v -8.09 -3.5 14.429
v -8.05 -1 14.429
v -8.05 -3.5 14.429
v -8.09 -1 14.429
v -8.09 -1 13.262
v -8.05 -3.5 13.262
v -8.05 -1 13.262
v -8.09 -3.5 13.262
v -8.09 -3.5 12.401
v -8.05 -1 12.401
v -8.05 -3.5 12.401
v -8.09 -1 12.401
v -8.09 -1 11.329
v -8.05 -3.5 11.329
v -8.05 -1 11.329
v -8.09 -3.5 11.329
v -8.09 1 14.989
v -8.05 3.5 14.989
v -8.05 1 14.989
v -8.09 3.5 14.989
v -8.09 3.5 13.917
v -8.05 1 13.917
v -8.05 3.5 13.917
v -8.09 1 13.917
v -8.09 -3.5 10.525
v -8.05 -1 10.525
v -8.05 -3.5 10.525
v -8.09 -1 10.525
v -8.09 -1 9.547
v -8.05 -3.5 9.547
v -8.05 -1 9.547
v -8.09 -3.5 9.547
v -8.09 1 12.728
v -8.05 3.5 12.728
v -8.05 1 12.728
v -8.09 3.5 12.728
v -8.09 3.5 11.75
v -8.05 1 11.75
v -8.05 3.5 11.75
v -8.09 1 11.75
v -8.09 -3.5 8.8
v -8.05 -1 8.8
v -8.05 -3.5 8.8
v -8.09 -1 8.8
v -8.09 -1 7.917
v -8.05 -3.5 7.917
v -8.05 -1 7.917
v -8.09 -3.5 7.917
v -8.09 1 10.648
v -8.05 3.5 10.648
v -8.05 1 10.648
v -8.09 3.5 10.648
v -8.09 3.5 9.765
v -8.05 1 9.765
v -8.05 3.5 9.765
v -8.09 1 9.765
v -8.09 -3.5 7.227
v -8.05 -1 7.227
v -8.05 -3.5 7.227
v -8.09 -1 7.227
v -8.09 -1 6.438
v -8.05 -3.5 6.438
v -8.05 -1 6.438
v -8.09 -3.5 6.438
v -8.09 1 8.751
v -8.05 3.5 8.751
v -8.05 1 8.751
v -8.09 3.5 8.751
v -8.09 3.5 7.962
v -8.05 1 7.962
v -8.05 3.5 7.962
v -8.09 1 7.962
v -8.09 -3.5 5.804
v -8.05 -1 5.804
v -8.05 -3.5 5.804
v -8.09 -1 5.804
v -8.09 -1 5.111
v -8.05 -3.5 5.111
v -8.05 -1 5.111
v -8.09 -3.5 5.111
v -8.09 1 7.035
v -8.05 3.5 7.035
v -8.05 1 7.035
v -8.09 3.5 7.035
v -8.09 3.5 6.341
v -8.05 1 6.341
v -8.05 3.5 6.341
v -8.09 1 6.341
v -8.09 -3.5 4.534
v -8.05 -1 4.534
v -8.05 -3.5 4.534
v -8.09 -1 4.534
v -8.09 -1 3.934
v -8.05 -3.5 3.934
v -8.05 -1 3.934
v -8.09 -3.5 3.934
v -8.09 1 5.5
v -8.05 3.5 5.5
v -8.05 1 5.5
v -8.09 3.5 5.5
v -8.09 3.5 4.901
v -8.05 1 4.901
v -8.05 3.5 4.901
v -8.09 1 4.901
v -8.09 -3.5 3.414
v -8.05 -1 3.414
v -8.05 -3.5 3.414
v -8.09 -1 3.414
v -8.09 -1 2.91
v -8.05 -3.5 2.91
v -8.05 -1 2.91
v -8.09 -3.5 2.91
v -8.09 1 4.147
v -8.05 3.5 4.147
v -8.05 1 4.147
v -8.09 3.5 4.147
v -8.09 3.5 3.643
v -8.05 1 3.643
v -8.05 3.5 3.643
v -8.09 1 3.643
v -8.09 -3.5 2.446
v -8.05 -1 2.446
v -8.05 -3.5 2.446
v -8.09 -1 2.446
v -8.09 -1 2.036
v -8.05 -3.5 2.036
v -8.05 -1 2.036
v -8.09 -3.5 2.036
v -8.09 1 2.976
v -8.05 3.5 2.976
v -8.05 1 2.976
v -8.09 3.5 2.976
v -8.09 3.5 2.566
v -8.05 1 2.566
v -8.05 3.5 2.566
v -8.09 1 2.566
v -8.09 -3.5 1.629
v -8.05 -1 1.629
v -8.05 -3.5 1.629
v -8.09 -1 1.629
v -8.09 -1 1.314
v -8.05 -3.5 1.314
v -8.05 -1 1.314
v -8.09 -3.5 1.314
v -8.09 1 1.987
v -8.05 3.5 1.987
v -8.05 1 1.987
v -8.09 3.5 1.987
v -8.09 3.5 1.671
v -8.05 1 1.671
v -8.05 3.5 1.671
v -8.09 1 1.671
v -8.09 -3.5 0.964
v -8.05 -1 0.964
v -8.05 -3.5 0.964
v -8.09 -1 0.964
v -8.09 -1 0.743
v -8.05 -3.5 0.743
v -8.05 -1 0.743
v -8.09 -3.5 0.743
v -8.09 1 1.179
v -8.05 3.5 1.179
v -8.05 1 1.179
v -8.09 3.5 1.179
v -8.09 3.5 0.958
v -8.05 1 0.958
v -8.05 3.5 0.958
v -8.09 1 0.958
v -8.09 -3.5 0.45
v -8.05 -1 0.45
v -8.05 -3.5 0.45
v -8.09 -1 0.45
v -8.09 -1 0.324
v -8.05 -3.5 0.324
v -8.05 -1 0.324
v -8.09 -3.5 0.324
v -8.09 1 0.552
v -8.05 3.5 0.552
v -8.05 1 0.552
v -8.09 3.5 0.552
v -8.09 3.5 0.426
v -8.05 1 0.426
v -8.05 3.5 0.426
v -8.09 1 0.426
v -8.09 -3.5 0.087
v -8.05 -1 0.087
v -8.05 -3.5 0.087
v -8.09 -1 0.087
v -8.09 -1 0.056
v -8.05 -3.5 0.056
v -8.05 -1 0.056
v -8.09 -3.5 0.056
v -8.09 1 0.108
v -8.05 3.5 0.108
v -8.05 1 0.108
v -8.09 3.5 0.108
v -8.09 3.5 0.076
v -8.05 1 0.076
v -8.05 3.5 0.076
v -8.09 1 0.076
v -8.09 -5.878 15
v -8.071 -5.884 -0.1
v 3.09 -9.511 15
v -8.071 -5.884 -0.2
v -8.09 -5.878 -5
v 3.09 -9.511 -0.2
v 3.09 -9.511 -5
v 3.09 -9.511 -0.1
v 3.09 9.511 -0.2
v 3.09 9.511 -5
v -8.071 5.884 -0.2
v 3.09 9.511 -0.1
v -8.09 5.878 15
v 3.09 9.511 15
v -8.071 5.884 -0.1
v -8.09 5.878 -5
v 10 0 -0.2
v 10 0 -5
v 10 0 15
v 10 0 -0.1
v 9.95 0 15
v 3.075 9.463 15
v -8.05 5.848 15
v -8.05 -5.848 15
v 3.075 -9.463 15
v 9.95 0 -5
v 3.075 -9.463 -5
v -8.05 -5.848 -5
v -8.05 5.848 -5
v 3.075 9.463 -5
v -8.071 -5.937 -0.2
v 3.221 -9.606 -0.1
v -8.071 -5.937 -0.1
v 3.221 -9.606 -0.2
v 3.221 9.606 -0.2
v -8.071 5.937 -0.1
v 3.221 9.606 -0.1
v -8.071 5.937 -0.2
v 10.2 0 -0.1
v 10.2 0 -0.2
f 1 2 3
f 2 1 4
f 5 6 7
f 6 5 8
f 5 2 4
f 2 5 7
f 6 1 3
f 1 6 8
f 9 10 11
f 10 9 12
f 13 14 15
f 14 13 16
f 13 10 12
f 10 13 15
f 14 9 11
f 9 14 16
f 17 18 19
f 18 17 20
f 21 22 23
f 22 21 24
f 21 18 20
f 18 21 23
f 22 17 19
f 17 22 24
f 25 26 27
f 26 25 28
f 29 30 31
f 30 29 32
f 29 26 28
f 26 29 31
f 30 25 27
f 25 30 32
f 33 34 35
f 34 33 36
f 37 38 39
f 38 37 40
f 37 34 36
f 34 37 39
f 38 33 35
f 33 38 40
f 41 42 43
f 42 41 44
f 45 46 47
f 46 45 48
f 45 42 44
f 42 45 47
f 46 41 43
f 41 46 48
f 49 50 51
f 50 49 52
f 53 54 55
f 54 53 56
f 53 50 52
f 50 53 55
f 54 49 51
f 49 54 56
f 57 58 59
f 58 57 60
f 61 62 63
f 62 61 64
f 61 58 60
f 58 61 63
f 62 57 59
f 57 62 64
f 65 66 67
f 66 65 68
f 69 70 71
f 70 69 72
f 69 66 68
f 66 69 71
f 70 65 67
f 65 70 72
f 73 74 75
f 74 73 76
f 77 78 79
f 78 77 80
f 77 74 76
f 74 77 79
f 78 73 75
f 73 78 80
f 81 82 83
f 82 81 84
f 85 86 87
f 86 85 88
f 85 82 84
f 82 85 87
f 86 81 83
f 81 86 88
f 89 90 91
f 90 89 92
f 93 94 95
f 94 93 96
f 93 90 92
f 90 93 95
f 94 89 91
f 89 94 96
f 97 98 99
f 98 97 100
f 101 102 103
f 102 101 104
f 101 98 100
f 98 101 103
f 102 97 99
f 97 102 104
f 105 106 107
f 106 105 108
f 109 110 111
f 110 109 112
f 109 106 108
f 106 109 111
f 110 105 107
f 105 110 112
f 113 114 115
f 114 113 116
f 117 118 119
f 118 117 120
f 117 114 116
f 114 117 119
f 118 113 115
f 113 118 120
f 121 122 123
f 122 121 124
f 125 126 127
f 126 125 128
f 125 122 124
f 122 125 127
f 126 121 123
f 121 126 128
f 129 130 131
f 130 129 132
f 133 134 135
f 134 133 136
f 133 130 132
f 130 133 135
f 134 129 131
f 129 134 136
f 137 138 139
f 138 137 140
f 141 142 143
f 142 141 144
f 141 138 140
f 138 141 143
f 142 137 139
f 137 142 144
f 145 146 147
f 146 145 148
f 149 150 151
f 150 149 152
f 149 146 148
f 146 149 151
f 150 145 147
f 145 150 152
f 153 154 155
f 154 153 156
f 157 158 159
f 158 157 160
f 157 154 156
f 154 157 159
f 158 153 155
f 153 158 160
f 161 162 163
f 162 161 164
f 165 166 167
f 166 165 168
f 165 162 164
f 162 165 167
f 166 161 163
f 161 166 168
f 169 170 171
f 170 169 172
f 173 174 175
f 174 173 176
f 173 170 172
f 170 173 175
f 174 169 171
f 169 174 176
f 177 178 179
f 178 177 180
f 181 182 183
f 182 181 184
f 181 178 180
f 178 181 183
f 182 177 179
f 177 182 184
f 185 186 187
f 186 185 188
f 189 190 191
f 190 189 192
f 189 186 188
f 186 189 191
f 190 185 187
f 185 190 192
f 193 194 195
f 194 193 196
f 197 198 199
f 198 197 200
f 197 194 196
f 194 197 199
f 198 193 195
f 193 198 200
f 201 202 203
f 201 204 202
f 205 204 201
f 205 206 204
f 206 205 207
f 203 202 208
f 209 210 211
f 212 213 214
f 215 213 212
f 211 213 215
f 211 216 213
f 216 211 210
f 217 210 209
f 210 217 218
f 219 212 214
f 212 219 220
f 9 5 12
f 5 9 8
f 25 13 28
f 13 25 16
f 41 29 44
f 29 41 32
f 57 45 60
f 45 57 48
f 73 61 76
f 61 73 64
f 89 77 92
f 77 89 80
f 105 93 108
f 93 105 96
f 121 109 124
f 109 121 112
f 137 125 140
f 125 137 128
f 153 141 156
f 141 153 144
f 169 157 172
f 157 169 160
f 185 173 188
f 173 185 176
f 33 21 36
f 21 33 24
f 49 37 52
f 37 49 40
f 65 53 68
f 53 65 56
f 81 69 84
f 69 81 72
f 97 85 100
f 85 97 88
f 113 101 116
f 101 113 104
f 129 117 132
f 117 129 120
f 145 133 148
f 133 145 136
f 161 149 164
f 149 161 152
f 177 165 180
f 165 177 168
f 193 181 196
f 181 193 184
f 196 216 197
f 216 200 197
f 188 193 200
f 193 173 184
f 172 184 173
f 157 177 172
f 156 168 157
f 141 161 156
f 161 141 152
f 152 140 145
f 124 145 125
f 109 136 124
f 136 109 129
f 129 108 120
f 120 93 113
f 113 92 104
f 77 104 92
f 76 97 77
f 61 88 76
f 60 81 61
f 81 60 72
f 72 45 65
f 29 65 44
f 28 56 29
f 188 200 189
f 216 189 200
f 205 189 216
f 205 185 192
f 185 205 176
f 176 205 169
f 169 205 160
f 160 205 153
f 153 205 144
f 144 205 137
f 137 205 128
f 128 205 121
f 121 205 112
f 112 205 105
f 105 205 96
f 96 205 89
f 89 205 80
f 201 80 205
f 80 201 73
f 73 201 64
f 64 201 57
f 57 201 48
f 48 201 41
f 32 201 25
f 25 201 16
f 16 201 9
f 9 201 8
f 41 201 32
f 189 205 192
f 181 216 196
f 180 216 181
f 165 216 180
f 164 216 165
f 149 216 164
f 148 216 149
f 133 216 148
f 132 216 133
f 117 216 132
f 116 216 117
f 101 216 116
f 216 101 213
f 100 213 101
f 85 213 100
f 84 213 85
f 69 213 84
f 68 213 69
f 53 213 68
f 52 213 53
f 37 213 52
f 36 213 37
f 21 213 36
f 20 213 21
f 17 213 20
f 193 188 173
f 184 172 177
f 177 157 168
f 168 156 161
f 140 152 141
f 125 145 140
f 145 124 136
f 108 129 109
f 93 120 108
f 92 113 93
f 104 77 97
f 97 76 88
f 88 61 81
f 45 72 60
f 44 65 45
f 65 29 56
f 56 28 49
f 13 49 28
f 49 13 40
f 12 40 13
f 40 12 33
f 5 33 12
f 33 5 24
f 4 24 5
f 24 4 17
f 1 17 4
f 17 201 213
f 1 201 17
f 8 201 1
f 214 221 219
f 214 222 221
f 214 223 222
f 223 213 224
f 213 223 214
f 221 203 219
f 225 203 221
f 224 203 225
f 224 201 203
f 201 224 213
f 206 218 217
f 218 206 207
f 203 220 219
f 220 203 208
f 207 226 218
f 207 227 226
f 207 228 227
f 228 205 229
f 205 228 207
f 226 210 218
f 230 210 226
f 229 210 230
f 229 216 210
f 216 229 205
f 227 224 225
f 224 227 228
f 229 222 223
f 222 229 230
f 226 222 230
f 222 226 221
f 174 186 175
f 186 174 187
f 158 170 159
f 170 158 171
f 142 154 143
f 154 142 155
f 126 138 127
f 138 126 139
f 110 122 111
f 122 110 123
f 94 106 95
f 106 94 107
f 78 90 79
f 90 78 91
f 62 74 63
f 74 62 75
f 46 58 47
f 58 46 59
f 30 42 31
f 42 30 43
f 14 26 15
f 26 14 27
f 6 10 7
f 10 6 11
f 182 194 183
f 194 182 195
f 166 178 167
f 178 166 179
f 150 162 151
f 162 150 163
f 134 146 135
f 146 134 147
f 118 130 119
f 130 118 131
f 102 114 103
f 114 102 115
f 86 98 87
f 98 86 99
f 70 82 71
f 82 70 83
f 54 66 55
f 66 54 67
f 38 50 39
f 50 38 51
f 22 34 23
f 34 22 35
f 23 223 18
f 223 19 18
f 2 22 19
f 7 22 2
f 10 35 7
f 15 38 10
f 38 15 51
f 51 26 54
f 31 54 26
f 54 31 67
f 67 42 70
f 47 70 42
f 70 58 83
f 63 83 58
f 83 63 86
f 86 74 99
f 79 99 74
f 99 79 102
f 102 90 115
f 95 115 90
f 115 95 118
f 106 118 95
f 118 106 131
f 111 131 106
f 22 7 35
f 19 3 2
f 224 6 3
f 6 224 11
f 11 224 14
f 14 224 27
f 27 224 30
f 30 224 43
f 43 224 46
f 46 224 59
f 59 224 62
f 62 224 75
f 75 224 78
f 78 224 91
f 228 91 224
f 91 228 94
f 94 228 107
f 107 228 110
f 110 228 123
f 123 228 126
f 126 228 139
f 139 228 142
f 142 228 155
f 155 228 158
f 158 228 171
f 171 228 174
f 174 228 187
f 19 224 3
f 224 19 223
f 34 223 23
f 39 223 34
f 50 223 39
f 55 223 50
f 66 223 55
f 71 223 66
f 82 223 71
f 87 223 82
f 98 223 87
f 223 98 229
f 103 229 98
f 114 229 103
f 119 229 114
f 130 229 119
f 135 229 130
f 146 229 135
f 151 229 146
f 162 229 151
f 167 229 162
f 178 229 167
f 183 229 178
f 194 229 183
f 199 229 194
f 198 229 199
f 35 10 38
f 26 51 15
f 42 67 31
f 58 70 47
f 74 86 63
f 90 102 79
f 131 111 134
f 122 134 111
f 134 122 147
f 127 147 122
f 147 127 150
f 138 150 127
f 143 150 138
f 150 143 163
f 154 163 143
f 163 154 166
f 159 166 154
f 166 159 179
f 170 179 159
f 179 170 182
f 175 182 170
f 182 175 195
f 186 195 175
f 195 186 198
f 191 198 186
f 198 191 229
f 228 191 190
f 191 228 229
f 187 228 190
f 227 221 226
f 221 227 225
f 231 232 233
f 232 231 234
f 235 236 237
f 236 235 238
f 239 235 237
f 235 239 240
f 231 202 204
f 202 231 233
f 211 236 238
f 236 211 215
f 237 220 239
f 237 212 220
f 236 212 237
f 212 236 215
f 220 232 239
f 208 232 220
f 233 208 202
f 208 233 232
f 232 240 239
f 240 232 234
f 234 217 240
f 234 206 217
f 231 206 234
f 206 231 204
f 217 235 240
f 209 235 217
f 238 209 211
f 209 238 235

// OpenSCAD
resolution = 5 ;
coulumRadius = 10;

coulumHeight = 20;



module coulum(height = 20, holeSpaceing = .5, radius = 10, wallThickness  = .05, holeWidth = 3
){
    union(){
    difference(){
        translate([0,0,-height /4])
        cylinder(h = height, r1 = radius, r2 = radius, $fn = resolution);
        translate([0,0,-.5 - height/4])
        cylinder(h = height + 1, r1 = radius - wallThickness, r2 = radius - wallThickness, $fn = resolution);
        
    
        
        resize([10,7,height], auto = true){
        for (gap = [height/3:-holeSpaceing:0]){
            echo(gap);
            gapp = gap + gap * gap * .8;
            Gapp = gap /2 /gap * gap;
            up = (gapp + Gapp) /5;
            translate([-radius/1.8,-holeWidth*.9,gapp])
            cube([radius,holeWidth,Gapp ], center = true);
            
            translate([-radius/1.8,holeWidth*.9,gapp + up])
            cube([radius,holeWidth,Gapp], center = true);
        }
    }
   }

   }
   difference(){
       translate([radius * .01,0,-.2])
cylinder(h = .1, r1 = radius* 1.01, r2 = radius *1.01, $fn = resolution);   
       translate([0,0,-.5 - height/4])
       cylinder(h = height + 1, r1 = radius - wallThickness, r2 = radius - wallThickness, $fn = resolution);
   }      
}
coulum();
